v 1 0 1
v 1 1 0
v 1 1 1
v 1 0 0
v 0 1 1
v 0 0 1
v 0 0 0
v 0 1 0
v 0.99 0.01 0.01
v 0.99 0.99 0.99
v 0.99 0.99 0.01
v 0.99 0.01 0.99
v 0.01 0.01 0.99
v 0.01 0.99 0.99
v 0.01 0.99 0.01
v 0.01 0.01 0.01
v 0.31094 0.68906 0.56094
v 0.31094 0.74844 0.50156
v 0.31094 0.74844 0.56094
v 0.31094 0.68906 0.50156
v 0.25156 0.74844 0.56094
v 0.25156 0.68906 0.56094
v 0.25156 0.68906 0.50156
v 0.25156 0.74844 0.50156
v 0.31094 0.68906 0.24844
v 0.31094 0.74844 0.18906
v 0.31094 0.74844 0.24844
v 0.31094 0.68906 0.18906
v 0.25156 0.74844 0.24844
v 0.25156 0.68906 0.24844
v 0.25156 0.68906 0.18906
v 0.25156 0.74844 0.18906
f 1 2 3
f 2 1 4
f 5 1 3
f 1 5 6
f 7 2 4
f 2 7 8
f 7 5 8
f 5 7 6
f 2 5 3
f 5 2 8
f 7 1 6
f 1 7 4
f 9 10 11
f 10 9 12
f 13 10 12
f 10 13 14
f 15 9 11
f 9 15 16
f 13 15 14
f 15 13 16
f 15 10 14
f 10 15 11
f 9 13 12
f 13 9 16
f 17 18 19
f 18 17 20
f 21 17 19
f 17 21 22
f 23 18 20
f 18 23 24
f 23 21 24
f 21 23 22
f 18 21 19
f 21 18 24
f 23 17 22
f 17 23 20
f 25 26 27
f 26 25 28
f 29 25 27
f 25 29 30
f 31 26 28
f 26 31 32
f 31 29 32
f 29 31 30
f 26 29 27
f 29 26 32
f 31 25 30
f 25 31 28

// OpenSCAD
translate([0.28125, 0.71875, 0.53125]) color([0.7100032073354428, 0.713232693986131, 0.2517171521870275]) cube([0.059375, 0.059375, 0.059375], center=true);
translate([0.28125, 0.71875, 0.21875]) color([0.9943090226941905, 0.6095053249337475, 0.19861554018184202]) cube([0.059375, 0.059375, 0.059375], center=true);
color([0.3,0.3,0.3,0.3]) difference() { cube([1,1,1]); translate([0.01,0.01,0.01]) cube([0.98,0.98,0.98]); }
